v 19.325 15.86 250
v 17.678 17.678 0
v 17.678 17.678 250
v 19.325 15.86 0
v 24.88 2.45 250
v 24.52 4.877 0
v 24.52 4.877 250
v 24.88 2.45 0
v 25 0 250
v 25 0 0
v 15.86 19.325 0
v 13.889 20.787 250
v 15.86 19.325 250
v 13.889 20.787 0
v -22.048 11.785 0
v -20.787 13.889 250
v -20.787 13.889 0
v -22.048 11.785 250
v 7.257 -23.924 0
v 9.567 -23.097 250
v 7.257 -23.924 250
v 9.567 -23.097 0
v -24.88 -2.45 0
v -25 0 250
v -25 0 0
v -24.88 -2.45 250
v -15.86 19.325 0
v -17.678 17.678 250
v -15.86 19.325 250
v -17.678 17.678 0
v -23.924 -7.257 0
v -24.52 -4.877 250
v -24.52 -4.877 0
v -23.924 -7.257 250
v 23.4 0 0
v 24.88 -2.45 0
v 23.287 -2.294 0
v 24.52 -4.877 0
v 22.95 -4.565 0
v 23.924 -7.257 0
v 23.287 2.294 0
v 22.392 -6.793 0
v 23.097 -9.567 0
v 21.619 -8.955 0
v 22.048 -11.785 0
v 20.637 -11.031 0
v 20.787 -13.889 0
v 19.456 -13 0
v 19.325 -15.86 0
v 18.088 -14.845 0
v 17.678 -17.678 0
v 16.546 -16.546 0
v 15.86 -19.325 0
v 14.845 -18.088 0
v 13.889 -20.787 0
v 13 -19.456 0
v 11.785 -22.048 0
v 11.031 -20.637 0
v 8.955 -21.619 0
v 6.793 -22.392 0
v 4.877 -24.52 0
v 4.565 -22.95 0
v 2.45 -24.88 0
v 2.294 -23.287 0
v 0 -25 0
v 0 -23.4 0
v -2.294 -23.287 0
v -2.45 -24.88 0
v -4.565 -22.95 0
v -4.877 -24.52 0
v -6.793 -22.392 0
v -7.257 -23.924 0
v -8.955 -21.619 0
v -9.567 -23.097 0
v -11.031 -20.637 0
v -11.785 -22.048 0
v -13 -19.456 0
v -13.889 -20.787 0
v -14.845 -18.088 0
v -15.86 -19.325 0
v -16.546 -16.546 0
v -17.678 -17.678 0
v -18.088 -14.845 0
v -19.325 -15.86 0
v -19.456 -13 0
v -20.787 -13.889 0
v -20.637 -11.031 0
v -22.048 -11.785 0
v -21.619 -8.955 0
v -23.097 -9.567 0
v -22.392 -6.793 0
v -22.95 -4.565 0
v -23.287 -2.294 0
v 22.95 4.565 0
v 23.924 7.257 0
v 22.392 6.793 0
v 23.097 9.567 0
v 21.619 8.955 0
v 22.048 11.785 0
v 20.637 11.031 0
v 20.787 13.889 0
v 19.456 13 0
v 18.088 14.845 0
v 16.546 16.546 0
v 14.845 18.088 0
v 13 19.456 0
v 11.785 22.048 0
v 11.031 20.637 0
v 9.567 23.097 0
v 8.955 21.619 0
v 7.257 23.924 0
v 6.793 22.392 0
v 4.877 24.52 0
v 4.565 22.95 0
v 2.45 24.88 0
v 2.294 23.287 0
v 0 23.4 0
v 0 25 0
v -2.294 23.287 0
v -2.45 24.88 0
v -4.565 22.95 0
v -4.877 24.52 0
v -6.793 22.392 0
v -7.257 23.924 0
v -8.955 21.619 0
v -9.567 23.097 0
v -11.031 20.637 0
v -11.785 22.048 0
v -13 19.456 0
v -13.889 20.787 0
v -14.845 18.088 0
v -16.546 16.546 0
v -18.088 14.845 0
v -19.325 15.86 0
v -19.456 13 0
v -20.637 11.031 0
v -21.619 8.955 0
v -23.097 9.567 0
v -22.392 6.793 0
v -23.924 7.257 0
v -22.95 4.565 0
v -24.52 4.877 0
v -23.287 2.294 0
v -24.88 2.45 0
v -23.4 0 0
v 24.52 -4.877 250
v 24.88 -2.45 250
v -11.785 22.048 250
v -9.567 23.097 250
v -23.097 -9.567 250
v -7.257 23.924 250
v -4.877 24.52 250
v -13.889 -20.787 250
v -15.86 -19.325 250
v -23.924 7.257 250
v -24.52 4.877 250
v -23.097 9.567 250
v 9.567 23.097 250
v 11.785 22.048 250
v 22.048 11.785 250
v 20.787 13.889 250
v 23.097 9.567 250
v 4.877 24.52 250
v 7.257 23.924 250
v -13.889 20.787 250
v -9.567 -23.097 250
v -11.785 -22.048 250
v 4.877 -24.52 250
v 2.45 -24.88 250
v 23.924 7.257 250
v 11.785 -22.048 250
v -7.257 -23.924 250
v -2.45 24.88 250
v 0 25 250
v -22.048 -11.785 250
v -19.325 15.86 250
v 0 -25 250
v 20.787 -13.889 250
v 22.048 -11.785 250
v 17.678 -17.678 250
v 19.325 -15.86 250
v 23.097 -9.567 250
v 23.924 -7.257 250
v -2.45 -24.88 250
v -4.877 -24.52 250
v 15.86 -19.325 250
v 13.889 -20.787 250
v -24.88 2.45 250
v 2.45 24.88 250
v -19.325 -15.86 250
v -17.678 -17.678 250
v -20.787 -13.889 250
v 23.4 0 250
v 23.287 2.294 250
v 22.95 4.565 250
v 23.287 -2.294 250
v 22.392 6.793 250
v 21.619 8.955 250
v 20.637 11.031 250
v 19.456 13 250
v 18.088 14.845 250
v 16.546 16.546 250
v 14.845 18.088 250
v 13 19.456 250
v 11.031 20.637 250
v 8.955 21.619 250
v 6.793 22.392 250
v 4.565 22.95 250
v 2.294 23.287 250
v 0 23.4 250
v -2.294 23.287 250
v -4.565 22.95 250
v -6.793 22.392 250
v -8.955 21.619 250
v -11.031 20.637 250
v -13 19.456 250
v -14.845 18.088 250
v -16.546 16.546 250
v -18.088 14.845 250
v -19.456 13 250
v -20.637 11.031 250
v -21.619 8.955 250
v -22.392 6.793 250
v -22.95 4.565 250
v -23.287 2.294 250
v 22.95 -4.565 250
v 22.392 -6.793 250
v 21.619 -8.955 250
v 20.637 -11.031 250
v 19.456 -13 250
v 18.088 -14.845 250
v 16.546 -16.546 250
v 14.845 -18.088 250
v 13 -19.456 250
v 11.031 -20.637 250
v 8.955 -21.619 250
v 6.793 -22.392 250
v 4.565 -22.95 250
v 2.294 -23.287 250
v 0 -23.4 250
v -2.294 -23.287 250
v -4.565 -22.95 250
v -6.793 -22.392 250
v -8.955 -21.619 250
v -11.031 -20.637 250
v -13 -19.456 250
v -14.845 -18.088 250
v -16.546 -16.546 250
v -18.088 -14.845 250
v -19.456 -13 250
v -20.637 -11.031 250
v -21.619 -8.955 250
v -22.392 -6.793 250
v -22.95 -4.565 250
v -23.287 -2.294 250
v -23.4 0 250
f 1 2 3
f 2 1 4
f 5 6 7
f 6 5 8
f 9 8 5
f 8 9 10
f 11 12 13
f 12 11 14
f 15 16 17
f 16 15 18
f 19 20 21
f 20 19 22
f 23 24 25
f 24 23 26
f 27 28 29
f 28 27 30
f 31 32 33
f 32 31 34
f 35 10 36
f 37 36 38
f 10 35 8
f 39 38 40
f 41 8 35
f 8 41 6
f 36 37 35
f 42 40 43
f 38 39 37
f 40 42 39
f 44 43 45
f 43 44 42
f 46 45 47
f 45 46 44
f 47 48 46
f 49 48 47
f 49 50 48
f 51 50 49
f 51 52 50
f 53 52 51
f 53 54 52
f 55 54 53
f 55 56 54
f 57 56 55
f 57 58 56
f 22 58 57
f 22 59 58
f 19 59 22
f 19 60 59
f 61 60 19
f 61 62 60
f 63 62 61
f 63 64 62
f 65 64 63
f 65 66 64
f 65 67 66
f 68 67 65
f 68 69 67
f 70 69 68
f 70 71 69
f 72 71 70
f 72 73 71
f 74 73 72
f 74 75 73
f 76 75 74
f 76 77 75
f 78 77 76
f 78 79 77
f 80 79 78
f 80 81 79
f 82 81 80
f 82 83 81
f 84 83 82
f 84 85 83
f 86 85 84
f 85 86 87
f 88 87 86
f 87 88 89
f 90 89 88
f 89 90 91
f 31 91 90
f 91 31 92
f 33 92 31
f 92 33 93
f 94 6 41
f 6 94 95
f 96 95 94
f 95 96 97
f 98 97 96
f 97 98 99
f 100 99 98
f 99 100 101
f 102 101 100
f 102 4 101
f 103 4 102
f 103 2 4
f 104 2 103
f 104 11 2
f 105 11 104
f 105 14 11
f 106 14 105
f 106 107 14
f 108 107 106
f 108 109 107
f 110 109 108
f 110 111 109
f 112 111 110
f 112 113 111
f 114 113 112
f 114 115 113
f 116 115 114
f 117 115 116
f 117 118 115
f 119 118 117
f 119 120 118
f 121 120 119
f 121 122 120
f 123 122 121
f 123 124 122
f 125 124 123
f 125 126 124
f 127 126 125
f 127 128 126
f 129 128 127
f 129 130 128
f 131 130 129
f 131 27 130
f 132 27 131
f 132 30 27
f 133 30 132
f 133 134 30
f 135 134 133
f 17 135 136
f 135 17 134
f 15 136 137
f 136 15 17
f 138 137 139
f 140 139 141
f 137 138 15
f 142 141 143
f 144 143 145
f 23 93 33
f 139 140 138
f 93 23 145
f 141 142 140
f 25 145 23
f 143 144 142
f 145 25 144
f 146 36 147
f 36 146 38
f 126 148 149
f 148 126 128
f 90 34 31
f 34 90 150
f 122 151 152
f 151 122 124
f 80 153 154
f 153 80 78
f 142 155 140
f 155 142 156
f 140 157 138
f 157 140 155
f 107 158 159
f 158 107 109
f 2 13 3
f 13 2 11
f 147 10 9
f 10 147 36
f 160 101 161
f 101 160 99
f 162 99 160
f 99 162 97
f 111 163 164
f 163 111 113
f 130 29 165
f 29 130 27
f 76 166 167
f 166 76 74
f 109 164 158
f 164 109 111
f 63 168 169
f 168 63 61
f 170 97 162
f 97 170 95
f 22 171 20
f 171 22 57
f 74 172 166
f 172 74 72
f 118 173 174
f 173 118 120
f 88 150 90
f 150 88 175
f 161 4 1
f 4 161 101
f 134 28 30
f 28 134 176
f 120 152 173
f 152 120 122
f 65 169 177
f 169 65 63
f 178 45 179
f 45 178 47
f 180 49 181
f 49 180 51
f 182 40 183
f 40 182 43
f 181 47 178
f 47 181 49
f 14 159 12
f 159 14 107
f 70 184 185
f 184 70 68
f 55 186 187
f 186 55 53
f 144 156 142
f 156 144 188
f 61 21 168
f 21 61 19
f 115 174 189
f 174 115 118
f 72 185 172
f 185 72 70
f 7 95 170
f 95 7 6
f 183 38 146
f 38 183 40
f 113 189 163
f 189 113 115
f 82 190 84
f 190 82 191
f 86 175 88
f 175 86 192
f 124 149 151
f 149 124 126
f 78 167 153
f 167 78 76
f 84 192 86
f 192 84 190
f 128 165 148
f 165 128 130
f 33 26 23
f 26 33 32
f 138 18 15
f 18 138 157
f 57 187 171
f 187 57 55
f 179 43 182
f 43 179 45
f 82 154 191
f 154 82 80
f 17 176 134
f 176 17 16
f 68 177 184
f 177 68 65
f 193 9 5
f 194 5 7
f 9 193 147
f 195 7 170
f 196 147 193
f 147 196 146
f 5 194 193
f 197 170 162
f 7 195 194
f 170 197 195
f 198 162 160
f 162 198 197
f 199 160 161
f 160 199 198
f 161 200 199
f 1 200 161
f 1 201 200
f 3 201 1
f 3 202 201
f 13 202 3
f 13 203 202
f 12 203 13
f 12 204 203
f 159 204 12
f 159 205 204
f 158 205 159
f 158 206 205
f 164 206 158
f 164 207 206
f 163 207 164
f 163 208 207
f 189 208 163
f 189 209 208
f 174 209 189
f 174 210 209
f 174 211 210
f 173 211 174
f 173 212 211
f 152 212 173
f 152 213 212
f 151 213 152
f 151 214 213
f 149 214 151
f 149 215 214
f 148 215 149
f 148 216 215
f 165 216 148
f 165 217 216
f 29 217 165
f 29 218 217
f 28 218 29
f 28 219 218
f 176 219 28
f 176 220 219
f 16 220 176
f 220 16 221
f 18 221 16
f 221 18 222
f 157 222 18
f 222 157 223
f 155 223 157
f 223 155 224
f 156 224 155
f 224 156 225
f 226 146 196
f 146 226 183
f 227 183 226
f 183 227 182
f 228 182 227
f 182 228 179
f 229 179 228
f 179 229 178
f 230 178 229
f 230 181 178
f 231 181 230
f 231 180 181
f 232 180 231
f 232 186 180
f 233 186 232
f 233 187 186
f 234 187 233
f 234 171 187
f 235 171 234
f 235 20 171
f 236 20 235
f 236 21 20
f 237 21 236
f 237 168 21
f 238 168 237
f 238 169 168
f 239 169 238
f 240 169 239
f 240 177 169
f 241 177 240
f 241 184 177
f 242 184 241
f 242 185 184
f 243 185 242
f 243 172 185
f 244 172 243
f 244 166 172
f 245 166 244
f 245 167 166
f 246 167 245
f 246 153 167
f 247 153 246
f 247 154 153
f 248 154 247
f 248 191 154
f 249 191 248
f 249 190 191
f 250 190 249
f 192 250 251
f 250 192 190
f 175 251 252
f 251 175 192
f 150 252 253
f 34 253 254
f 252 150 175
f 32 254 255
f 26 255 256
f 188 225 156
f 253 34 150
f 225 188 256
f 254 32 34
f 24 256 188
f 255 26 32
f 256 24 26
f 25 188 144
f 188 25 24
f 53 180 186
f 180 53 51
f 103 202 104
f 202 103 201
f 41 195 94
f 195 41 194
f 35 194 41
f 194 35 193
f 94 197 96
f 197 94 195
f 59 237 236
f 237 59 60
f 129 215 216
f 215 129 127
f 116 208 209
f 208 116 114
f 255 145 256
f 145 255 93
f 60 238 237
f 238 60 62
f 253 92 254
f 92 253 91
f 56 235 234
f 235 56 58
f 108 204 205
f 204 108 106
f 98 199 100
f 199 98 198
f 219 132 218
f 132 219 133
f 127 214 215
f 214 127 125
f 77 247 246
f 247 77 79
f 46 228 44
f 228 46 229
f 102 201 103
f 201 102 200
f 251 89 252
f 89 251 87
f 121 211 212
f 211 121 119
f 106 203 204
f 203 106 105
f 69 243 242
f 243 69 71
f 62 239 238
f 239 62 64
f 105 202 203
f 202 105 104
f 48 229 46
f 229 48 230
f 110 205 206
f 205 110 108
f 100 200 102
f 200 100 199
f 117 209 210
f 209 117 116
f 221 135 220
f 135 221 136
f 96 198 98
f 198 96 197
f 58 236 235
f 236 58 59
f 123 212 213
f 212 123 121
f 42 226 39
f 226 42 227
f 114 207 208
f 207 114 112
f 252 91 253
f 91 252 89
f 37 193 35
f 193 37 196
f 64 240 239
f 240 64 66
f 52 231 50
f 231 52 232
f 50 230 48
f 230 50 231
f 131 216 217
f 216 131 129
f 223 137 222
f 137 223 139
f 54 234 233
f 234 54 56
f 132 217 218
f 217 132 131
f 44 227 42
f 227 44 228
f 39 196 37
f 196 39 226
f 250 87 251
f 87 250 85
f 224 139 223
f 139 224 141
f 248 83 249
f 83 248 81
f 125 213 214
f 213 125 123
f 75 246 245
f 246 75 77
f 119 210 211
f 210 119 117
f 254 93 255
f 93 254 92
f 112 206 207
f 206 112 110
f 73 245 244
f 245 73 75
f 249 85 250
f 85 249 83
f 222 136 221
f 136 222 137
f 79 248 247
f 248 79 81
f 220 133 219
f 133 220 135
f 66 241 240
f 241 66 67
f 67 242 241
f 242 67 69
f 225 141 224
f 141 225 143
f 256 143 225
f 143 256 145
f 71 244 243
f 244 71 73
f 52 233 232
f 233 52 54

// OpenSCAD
// Parameters
pipe_standard = 0; //[0:0:1]
nominal_size = 50; //[25:110:1]
length_mm = 250; //[125:500:1]
center = 0; //[0:1:1]
ht50_outer_diameter = 50; //[40:80:0.5]
ht50_wall_thickness = 1.8; //[1:4:0.1]
bore_clearance = 0.2; //[0:0.6:0.05]
bore_extra_length = 1; //[0.5:3:0.5]

// HT Pipe - complete geometry
module ht_pipe() {
  color([0.85, 0.85, 0.8]) { // PVC color
    difference() {
      // Outer pipe segment
      translate([0, 0, 0])
        cylinder(h=length_mm, r=ht50_outer_diameter/2, center=false, $fn=64);
      
      // Inner hollow bore
      translate([0, 0, -bore_extra_length])
        cylinder(h=length_mm + 2*bore_extra_length, 
                 r=ht50_outer_diameter/2 - ht50_wall_thickness + bore_clearance, 
                 center=false, $fn=64);
    }
  }
}

// Assembly
module assembly() {
  ht_pipe();
}

assembly();
